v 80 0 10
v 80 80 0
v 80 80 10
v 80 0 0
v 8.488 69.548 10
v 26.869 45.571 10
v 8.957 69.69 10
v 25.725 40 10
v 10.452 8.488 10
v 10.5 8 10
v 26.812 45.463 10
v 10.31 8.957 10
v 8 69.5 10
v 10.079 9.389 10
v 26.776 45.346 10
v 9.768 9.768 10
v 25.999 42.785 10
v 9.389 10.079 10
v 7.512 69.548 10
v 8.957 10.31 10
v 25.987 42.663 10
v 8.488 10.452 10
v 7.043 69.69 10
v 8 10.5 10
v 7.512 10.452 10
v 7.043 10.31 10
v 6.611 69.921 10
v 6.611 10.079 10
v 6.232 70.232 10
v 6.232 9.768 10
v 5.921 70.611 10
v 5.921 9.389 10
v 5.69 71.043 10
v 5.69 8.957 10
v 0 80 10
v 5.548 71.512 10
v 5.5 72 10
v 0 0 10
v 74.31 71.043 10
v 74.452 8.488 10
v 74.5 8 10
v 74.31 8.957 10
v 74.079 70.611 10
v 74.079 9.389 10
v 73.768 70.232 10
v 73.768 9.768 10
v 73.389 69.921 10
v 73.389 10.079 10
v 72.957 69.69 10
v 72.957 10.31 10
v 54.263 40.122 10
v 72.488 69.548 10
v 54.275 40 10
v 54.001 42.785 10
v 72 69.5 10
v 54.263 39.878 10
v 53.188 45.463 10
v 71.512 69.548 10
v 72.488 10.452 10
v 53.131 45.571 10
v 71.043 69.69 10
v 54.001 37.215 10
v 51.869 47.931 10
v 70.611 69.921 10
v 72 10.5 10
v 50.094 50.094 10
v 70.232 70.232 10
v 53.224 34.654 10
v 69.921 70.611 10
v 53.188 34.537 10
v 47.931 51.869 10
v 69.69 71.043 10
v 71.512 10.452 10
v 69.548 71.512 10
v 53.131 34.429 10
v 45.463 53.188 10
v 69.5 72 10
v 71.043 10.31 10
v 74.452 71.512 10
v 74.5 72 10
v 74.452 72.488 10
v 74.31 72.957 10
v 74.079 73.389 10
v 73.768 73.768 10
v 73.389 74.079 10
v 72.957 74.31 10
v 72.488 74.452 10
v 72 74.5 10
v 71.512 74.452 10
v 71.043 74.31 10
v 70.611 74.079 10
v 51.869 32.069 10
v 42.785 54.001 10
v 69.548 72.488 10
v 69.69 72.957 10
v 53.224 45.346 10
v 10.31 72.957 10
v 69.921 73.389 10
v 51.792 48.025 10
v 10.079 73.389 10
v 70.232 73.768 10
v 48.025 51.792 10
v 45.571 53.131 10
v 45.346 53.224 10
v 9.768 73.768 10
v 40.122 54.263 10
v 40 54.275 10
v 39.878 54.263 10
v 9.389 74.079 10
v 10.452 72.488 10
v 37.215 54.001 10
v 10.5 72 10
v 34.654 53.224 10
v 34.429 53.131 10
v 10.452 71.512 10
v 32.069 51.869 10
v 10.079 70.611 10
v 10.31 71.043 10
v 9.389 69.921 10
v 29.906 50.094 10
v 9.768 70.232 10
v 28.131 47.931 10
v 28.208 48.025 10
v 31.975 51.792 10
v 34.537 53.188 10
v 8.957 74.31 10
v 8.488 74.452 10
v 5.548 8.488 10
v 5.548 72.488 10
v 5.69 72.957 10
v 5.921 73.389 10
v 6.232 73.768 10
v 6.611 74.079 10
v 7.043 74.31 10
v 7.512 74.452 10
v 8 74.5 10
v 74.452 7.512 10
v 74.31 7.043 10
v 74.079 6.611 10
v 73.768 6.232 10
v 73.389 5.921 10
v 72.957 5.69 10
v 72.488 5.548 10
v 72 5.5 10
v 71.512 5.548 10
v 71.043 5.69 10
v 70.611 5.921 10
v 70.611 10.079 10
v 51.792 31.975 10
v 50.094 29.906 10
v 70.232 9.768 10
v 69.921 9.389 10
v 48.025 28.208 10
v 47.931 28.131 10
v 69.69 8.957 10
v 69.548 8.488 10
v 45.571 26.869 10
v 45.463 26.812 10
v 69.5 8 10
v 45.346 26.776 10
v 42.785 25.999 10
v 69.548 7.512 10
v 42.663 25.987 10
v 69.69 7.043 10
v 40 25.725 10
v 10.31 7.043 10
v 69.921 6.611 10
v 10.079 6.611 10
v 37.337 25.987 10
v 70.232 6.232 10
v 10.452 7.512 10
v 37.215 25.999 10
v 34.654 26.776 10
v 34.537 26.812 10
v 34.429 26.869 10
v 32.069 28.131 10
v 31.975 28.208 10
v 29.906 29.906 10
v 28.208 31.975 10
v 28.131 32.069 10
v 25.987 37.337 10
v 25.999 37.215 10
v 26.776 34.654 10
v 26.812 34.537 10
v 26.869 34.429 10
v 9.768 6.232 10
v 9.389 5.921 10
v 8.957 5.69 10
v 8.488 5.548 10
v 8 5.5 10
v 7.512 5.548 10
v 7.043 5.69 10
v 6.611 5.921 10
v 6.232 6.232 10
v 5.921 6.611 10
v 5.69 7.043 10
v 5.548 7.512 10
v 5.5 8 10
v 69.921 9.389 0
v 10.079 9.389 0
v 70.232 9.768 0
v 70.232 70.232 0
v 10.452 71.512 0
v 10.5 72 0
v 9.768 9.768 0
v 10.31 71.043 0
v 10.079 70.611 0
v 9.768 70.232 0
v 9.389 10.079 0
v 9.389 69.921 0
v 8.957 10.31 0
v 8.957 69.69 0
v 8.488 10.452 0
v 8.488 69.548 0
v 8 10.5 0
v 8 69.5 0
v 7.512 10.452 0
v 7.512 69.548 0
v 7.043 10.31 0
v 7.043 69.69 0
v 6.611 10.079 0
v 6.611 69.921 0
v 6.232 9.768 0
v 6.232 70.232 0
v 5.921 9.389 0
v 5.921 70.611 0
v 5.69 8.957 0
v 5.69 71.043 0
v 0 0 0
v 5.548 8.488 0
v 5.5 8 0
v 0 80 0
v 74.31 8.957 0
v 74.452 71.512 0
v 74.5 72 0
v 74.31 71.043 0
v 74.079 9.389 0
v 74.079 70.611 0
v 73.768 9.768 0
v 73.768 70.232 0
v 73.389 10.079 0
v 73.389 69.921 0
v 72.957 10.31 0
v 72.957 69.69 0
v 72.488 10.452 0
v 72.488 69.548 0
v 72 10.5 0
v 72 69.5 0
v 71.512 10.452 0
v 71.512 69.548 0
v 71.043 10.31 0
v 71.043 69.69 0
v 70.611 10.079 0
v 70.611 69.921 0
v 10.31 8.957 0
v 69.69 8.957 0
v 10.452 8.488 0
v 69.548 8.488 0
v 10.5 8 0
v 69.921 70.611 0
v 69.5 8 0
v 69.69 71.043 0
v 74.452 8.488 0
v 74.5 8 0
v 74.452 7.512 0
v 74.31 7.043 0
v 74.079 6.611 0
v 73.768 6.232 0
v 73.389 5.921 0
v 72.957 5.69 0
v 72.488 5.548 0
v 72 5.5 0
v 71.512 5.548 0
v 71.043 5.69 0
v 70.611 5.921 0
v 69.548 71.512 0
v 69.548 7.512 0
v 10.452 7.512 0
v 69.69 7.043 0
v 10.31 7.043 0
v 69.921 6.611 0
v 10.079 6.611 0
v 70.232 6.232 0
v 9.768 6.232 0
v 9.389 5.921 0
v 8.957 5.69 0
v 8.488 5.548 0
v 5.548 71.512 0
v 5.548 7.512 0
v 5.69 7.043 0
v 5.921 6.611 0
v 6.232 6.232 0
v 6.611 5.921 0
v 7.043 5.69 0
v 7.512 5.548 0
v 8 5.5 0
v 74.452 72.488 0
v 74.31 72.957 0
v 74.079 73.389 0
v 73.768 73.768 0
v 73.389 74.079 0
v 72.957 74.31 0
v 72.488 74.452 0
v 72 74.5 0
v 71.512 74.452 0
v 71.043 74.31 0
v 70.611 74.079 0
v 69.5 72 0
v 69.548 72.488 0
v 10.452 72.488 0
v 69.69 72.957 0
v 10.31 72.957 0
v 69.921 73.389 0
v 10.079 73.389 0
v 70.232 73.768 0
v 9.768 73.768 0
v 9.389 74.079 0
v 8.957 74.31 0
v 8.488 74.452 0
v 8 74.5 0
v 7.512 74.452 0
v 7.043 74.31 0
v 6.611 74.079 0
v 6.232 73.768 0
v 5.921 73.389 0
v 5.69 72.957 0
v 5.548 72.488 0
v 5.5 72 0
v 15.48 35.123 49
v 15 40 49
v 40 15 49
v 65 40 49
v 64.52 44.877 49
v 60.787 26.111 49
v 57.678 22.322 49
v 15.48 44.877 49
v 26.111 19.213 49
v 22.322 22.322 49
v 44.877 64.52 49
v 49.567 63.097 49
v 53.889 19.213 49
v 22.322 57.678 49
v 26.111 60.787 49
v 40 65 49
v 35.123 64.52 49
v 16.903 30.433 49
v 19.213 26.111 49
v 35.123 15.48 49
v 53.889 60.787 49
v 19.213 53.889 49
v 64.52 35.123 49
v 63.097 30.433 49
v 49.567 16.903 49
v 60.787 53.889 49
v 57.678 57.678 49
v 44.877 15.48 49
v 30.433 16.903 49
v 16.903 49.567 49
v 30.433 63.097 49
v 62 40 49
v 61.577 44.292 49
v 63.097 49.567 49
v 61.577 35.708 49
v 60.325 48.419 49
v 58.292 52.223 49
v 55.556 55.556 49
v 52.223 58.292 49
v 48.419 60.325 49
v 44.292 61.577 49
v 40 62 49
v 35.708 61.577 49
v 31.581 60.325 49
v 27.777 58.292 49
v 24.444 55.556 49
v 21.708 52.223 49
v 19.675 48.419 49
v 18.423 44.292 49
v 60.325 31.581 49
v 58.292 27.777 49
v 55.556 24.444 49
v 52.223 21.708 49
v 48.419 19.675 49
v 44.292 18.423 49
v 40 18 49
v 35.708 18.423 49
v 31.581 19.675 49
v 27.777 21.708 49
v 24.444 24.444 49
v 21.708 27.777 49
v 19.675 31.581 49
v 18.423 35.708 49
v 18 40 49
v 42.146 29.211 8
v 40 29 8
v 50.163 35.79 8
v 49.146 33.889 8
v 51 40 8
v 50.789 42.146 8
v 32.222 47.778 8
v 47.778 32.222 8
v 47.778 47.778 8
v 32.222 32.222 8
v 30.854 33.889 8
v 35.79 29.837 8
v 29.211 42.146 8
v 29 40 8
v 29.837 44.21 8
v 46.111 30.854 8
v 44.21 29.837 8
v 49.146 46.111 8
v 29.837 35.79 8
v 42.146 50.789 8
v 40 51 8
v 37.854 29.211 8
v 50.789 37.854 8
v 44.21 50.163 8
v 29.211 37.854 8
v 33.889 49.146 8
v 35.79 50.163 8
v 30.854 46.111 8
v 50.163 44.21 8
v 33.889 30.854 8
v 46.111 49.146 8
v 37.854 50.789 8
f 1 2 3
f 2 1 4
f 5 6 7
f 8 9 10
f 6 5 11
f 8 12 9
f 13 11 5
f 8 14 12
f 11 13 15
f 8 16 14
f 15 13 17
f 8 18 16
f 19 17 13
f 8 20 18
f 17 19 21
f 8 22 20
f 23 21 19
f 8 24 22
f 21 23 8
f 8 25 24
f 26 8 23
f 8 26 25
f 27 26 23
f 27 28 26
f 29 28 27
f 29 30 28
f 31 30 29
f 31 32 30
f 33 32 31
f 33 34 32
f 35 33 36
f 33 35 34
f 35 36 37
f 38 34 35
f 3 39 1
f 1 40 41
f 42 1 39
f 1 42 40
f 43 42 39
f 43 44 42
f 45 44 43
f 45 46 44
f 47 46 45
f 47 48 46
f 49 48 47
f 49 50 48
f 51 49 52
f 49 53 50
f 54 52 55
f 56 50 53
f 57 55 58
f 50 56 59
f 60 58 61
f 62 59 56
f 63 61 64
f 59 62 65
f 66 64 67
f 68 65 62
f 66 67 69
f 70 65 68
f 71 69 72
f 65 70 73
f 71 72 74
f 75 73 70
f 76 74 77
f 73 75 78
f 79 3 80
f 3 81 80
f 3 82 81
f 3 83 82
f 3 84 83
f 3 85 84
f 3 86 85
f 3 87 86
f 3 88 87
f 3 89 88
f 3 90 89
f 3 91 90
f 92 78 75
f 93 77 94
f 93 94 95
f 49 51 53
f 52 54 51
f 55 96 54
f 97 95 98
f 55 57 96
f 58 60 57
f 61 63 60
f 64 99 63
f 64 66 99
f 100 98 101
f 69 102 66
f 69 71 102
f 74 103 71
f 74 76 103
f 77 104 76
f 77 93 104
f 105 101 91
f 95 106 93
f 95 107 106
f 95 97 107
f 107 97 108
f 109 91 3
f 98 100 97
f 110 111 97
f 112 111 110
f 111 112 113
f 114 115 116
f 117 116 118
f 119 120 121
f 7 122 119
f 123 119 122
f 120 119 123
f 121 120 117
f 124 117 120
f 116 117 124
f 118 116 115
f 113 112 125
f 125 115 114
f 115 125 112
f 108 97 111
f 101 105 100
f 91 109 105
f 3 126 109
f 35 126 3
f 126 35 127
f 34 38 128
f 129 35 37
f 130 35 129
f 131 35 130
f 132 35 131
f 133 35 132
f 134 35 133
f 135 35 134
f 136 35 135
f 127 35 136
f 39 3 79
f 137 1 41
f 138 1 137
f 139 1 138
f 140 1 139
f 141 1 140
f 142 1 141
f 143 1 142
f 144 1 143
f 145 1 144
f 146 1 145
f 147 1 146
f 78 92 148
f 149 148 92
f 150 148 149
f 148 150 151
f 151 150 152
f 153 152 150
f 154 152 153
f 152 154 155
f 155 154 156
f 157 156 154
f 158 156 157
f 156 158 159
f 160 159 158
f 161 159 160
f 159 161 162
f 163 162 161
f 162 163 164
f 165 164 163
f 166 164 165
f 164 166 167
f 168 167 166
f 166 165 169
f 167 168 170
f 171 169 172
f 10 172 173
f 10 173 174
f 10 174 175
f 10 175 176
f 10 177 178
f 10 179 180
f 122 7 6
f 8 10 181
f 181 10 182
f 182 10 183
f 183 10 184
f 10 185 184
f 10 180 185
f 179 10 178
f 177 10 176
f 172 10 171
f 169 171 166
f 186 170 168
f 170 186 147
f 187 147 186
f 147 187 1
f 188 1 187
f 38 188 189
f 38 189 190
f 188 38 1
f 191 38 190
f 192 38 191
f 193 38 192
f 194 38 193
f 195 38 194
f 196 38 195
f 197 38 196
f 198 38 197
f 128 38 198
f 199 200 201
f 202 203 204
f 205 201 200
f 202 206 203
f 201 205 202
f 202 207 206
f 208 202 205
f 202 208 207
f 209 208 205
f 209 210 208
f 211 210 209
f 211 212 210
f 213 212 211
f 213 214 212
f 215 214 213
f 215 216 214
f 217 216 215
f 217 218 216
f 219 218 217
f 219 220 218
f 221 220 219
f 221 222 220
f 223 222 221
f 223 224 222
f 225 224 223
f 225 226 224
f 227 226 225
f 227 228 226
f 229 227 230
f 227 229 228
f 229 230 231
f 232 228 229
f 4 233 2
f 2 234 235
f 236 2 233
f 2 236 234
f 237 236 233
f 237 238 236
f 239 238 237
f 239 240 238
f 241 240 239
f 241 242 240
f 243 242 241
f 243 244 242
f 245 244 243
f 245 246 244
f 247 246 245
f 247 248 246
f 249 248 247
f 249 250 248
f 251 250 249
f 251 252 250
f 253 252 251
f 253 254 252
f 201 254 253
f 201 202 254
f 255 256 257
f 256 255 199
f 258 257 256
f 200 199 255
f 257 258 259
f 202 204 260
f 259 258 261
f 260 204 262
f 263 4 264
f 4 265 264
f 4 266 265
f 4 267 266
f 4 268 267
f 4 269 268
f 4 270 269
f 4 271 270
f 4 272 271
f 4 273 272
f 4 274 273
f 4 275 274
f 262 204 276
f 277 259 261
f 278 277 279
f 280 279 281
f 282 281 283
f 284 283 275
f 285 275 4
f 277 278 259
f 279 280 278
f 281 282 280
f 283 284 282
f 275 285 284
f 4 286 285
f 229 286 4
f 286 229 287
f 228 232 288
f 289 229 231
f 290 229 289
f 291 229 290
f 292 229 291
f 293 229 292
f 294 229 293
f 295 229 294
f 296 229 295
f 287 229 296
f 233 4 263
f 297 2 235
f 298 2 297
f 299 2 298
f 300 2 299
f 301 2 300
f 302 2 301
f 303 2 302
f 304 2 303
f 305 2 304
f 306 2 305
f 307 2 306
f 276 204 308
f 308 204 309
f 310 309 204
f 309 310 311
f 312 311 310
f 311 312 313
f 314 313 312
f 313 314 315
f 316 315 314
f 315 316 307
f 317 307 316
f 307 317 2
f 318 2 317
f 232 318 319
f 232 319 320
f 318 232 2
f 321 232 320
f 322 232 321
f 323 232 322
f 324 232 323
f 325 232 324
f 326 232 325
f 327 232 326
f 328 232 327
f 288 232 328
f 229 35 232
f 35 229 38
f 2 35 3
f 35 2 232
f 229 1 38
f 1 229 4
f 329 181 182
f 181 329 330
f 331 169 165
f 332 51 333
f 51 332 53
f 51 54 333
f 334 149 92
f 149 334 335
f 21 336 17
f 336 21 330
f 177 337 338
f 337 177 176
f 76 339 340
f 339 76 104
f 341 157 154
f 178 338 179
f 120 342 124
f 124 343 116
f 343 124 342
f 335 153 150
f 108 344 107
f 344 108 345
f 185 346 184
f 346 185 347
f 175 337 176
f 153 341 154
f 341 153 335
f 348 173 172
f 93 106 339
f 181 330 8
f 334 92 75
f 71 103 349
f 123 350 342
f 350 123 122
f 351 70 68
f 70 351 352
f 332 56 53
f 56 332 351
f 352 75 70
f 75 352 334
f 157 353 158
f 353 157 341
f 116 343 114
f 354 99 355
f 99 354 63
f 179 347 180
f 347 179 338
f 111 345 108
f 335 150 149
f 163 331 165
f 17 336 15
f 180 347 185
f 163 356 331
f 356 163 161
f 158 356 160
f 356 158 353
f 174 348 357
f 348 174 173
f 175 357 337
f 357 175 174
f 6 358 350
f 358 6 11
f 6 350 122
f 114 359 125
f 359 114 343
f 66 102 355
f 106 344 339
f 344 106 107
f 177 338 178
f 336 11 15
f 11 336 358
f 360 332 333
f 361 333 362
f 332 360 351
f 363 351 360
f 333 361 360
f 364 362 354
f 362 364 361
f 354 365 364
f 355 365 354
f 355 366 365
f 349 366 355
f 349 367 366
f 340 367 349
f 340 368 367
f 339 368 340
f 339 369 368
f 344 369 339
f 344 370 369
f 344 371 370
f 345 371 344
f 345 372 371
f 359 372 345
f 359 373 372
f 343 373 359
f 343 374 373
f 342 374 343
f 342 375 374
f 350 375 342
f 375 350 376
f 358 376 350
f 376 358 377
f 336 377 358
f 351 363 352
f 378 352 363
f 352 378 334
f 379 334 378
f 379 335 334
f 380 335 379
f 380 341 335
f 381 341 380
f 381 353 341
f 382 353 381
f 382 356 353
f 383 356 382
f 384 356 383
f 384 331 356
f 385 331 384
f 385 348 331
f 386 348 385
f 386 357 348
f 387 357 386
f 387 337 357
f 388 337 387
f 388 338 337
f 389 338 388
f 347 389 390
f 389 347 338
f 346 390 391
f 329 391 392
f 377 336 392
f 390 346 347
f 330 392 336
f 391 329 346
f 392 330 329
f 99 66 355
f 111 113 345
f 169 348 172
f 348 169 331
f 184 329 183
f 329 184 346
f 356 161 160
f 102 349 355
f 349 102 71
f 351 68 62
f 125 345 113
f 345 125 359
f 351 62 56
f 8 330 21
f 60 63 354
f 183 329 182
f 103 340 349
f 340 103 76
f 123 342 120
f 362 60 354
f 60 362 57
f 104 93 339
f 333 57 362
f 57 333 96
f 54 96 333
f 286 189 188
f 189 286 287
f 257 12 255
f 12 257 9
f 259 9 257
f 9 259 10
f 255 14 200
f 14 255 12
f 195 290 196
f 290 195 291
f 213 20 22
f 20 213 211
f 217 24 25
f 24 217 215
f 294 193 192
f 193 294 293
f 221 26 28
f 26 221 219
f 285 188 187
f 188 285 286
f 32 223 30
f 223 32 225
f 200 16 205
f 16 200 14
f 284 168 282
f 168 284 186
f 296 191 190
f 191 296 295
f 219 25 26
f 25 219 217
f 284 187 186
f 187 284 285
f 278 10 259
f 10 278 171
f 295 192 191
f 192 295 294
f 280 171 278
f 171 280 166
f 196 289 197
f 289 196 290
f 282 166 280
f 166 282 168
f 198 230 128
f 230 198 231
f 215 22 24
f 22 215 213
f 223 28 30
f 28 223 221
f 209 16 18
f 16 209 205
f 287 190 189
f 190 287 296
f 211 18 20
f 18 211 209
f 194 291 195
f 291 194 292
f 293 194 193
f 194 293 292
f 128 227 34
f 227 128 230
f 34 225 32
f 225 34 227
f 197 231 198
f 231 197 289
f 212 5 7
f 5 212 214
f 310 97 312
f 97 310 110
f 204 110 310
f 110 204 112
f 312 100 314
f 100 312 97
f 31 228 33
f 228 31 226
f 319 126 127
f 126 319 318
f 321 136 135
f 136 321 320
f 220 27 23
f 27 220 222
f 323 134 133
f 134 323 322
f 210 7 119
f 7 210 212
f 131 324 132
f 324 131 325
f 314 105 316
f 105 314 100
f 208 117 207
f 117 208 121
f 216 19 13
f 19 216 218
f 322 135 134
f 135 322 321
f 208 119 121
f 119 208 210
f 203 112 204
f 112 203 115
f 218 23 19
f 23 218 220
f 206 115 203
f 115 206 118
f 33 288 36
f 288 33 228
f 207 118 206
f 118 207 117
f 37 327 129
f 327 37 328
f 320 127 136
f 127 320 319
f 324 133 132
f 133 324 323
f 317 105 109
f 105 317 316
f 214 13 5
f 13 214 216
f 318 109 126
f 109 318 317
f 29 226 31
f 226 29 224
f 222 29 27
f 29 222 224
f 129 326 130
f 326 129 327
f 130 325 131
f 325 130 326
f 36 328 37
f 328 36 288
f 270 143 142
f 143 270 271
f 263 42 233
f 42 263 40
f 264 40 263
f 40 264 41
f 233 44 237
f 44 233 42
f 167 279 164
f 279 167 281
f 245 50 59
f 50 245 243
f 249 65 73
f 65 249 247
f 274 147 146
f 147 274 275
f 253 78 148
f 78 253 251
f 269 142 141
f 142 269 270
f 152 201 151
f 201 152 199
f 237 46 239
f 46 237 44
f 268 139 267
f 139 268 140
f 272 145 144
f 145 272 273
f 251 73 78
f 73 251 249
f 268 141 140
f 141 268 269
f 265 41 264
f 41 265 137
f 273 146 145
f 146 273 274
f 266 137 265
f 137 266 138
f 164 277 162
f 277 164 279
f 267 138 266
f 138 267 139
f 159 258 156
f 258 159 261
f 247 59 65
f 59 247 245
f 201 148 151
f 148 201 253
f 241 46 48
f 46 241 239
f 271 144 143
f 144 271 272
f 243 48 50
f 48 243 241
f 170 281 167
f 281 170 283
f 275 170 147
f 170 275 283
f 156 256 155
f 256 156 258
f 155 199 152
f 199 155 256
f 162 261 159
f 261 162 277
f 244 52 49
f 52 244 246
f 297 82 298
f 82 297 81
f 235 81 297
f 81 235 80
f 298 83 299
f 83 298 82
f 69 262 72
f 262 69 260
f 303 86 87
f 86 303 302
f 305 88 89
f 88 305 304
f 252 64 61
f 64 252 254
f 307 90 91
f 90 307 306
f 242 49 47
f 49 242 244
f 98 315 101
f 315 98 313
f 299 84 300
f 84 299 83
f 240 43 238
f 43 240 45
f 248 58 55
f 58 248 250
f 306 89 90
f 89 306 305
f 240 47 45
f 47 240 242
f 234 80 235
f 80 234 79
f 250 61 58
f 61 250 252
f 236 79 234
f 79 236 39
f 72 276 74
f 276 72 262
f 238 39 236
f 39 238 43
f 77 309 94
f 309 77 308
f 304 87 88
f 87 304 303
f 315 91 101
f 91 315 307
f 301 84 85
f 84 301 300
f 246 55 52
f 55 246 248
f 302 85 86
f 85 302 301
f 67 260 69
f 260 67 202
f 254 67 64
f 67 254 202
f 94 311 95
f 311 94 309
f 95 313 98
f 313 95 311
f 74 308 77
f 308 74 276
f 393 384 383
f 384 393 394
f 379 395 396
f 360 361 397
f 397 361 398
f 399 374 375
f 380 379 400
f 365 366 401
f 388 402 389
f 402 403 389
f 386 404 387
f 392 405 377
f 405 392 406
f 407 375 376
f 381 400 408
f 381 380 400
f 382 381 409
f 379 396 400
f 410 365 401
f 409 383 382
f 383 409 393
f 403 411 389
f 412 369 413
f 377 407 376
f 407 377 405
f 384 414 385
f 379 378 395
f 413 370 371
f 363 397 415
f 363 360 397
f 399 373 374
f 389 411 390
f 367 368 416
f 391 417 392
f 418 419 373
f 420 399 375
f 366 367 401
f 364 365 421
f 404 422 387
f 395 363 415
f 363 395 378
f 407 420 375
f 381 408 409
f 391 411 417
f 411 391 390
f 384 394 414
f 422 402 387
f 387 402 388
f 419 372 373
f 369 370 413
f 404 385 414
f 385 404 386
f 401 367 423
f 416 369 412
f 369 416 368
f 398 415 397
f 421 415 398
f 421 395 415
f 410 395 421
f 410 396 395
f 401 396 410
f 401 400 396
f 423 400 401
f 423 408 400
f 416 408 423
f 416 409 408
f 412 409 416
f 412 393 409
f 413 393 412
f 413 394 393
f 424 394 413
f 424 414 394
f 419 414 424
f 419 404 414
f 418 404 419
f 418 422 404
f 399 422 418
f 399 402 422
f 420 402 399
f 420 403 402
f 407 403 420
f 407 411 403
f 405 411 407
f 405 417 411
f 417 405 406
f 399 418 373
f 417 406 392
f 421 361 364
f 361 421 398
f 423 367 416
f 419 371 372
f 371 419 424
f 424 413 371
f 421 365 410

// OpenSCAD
$fn = 32;

// ----------------------------------------------------------------------
// Hopper: flanged with square flange
// ----------------------------------------------------------------------

// --- parameters (mm) ---
fl = 80;                  // flange side, X and Y
fl_t = 10;                // flange thickness
cone_h = 40;              // cone height above the flange
top_d = 50;               // cone mouth diameter
bot_d = 28;               // cone spout diameter
wall = 3;                 // cone wall thickness
hole_r = 2.5;             // flange hole radius
hole_in = 8;              // hole inset from the corners

bore_d = bot_d - 2 * wall;  // spout bore diameter
total_h = fl_t + cone_h - 1;  // overall height

difference() {
  union() {
    cube([fl, fl, fl_t]);
    translate([fl / 2, fl / 2, fl_t - 1])
      cylinder(h = cone_h, d1 = bot_d, d2 = top_d);
  }
  translate([fl / 2, fl / 2, fl_t - 2])
    cylinder(h = cone_h + 1, d1 = bore_d, d2 = top_d - 2 * wall);
  for (sx = [0, 1], sy = [0, 1])
    translate([sx ? fl - hole_in : hole_in,
               sy ? fl - hole_in : hole_in, -1])
      cylinder(r = hole_r, h = fl_t + 2);
}
